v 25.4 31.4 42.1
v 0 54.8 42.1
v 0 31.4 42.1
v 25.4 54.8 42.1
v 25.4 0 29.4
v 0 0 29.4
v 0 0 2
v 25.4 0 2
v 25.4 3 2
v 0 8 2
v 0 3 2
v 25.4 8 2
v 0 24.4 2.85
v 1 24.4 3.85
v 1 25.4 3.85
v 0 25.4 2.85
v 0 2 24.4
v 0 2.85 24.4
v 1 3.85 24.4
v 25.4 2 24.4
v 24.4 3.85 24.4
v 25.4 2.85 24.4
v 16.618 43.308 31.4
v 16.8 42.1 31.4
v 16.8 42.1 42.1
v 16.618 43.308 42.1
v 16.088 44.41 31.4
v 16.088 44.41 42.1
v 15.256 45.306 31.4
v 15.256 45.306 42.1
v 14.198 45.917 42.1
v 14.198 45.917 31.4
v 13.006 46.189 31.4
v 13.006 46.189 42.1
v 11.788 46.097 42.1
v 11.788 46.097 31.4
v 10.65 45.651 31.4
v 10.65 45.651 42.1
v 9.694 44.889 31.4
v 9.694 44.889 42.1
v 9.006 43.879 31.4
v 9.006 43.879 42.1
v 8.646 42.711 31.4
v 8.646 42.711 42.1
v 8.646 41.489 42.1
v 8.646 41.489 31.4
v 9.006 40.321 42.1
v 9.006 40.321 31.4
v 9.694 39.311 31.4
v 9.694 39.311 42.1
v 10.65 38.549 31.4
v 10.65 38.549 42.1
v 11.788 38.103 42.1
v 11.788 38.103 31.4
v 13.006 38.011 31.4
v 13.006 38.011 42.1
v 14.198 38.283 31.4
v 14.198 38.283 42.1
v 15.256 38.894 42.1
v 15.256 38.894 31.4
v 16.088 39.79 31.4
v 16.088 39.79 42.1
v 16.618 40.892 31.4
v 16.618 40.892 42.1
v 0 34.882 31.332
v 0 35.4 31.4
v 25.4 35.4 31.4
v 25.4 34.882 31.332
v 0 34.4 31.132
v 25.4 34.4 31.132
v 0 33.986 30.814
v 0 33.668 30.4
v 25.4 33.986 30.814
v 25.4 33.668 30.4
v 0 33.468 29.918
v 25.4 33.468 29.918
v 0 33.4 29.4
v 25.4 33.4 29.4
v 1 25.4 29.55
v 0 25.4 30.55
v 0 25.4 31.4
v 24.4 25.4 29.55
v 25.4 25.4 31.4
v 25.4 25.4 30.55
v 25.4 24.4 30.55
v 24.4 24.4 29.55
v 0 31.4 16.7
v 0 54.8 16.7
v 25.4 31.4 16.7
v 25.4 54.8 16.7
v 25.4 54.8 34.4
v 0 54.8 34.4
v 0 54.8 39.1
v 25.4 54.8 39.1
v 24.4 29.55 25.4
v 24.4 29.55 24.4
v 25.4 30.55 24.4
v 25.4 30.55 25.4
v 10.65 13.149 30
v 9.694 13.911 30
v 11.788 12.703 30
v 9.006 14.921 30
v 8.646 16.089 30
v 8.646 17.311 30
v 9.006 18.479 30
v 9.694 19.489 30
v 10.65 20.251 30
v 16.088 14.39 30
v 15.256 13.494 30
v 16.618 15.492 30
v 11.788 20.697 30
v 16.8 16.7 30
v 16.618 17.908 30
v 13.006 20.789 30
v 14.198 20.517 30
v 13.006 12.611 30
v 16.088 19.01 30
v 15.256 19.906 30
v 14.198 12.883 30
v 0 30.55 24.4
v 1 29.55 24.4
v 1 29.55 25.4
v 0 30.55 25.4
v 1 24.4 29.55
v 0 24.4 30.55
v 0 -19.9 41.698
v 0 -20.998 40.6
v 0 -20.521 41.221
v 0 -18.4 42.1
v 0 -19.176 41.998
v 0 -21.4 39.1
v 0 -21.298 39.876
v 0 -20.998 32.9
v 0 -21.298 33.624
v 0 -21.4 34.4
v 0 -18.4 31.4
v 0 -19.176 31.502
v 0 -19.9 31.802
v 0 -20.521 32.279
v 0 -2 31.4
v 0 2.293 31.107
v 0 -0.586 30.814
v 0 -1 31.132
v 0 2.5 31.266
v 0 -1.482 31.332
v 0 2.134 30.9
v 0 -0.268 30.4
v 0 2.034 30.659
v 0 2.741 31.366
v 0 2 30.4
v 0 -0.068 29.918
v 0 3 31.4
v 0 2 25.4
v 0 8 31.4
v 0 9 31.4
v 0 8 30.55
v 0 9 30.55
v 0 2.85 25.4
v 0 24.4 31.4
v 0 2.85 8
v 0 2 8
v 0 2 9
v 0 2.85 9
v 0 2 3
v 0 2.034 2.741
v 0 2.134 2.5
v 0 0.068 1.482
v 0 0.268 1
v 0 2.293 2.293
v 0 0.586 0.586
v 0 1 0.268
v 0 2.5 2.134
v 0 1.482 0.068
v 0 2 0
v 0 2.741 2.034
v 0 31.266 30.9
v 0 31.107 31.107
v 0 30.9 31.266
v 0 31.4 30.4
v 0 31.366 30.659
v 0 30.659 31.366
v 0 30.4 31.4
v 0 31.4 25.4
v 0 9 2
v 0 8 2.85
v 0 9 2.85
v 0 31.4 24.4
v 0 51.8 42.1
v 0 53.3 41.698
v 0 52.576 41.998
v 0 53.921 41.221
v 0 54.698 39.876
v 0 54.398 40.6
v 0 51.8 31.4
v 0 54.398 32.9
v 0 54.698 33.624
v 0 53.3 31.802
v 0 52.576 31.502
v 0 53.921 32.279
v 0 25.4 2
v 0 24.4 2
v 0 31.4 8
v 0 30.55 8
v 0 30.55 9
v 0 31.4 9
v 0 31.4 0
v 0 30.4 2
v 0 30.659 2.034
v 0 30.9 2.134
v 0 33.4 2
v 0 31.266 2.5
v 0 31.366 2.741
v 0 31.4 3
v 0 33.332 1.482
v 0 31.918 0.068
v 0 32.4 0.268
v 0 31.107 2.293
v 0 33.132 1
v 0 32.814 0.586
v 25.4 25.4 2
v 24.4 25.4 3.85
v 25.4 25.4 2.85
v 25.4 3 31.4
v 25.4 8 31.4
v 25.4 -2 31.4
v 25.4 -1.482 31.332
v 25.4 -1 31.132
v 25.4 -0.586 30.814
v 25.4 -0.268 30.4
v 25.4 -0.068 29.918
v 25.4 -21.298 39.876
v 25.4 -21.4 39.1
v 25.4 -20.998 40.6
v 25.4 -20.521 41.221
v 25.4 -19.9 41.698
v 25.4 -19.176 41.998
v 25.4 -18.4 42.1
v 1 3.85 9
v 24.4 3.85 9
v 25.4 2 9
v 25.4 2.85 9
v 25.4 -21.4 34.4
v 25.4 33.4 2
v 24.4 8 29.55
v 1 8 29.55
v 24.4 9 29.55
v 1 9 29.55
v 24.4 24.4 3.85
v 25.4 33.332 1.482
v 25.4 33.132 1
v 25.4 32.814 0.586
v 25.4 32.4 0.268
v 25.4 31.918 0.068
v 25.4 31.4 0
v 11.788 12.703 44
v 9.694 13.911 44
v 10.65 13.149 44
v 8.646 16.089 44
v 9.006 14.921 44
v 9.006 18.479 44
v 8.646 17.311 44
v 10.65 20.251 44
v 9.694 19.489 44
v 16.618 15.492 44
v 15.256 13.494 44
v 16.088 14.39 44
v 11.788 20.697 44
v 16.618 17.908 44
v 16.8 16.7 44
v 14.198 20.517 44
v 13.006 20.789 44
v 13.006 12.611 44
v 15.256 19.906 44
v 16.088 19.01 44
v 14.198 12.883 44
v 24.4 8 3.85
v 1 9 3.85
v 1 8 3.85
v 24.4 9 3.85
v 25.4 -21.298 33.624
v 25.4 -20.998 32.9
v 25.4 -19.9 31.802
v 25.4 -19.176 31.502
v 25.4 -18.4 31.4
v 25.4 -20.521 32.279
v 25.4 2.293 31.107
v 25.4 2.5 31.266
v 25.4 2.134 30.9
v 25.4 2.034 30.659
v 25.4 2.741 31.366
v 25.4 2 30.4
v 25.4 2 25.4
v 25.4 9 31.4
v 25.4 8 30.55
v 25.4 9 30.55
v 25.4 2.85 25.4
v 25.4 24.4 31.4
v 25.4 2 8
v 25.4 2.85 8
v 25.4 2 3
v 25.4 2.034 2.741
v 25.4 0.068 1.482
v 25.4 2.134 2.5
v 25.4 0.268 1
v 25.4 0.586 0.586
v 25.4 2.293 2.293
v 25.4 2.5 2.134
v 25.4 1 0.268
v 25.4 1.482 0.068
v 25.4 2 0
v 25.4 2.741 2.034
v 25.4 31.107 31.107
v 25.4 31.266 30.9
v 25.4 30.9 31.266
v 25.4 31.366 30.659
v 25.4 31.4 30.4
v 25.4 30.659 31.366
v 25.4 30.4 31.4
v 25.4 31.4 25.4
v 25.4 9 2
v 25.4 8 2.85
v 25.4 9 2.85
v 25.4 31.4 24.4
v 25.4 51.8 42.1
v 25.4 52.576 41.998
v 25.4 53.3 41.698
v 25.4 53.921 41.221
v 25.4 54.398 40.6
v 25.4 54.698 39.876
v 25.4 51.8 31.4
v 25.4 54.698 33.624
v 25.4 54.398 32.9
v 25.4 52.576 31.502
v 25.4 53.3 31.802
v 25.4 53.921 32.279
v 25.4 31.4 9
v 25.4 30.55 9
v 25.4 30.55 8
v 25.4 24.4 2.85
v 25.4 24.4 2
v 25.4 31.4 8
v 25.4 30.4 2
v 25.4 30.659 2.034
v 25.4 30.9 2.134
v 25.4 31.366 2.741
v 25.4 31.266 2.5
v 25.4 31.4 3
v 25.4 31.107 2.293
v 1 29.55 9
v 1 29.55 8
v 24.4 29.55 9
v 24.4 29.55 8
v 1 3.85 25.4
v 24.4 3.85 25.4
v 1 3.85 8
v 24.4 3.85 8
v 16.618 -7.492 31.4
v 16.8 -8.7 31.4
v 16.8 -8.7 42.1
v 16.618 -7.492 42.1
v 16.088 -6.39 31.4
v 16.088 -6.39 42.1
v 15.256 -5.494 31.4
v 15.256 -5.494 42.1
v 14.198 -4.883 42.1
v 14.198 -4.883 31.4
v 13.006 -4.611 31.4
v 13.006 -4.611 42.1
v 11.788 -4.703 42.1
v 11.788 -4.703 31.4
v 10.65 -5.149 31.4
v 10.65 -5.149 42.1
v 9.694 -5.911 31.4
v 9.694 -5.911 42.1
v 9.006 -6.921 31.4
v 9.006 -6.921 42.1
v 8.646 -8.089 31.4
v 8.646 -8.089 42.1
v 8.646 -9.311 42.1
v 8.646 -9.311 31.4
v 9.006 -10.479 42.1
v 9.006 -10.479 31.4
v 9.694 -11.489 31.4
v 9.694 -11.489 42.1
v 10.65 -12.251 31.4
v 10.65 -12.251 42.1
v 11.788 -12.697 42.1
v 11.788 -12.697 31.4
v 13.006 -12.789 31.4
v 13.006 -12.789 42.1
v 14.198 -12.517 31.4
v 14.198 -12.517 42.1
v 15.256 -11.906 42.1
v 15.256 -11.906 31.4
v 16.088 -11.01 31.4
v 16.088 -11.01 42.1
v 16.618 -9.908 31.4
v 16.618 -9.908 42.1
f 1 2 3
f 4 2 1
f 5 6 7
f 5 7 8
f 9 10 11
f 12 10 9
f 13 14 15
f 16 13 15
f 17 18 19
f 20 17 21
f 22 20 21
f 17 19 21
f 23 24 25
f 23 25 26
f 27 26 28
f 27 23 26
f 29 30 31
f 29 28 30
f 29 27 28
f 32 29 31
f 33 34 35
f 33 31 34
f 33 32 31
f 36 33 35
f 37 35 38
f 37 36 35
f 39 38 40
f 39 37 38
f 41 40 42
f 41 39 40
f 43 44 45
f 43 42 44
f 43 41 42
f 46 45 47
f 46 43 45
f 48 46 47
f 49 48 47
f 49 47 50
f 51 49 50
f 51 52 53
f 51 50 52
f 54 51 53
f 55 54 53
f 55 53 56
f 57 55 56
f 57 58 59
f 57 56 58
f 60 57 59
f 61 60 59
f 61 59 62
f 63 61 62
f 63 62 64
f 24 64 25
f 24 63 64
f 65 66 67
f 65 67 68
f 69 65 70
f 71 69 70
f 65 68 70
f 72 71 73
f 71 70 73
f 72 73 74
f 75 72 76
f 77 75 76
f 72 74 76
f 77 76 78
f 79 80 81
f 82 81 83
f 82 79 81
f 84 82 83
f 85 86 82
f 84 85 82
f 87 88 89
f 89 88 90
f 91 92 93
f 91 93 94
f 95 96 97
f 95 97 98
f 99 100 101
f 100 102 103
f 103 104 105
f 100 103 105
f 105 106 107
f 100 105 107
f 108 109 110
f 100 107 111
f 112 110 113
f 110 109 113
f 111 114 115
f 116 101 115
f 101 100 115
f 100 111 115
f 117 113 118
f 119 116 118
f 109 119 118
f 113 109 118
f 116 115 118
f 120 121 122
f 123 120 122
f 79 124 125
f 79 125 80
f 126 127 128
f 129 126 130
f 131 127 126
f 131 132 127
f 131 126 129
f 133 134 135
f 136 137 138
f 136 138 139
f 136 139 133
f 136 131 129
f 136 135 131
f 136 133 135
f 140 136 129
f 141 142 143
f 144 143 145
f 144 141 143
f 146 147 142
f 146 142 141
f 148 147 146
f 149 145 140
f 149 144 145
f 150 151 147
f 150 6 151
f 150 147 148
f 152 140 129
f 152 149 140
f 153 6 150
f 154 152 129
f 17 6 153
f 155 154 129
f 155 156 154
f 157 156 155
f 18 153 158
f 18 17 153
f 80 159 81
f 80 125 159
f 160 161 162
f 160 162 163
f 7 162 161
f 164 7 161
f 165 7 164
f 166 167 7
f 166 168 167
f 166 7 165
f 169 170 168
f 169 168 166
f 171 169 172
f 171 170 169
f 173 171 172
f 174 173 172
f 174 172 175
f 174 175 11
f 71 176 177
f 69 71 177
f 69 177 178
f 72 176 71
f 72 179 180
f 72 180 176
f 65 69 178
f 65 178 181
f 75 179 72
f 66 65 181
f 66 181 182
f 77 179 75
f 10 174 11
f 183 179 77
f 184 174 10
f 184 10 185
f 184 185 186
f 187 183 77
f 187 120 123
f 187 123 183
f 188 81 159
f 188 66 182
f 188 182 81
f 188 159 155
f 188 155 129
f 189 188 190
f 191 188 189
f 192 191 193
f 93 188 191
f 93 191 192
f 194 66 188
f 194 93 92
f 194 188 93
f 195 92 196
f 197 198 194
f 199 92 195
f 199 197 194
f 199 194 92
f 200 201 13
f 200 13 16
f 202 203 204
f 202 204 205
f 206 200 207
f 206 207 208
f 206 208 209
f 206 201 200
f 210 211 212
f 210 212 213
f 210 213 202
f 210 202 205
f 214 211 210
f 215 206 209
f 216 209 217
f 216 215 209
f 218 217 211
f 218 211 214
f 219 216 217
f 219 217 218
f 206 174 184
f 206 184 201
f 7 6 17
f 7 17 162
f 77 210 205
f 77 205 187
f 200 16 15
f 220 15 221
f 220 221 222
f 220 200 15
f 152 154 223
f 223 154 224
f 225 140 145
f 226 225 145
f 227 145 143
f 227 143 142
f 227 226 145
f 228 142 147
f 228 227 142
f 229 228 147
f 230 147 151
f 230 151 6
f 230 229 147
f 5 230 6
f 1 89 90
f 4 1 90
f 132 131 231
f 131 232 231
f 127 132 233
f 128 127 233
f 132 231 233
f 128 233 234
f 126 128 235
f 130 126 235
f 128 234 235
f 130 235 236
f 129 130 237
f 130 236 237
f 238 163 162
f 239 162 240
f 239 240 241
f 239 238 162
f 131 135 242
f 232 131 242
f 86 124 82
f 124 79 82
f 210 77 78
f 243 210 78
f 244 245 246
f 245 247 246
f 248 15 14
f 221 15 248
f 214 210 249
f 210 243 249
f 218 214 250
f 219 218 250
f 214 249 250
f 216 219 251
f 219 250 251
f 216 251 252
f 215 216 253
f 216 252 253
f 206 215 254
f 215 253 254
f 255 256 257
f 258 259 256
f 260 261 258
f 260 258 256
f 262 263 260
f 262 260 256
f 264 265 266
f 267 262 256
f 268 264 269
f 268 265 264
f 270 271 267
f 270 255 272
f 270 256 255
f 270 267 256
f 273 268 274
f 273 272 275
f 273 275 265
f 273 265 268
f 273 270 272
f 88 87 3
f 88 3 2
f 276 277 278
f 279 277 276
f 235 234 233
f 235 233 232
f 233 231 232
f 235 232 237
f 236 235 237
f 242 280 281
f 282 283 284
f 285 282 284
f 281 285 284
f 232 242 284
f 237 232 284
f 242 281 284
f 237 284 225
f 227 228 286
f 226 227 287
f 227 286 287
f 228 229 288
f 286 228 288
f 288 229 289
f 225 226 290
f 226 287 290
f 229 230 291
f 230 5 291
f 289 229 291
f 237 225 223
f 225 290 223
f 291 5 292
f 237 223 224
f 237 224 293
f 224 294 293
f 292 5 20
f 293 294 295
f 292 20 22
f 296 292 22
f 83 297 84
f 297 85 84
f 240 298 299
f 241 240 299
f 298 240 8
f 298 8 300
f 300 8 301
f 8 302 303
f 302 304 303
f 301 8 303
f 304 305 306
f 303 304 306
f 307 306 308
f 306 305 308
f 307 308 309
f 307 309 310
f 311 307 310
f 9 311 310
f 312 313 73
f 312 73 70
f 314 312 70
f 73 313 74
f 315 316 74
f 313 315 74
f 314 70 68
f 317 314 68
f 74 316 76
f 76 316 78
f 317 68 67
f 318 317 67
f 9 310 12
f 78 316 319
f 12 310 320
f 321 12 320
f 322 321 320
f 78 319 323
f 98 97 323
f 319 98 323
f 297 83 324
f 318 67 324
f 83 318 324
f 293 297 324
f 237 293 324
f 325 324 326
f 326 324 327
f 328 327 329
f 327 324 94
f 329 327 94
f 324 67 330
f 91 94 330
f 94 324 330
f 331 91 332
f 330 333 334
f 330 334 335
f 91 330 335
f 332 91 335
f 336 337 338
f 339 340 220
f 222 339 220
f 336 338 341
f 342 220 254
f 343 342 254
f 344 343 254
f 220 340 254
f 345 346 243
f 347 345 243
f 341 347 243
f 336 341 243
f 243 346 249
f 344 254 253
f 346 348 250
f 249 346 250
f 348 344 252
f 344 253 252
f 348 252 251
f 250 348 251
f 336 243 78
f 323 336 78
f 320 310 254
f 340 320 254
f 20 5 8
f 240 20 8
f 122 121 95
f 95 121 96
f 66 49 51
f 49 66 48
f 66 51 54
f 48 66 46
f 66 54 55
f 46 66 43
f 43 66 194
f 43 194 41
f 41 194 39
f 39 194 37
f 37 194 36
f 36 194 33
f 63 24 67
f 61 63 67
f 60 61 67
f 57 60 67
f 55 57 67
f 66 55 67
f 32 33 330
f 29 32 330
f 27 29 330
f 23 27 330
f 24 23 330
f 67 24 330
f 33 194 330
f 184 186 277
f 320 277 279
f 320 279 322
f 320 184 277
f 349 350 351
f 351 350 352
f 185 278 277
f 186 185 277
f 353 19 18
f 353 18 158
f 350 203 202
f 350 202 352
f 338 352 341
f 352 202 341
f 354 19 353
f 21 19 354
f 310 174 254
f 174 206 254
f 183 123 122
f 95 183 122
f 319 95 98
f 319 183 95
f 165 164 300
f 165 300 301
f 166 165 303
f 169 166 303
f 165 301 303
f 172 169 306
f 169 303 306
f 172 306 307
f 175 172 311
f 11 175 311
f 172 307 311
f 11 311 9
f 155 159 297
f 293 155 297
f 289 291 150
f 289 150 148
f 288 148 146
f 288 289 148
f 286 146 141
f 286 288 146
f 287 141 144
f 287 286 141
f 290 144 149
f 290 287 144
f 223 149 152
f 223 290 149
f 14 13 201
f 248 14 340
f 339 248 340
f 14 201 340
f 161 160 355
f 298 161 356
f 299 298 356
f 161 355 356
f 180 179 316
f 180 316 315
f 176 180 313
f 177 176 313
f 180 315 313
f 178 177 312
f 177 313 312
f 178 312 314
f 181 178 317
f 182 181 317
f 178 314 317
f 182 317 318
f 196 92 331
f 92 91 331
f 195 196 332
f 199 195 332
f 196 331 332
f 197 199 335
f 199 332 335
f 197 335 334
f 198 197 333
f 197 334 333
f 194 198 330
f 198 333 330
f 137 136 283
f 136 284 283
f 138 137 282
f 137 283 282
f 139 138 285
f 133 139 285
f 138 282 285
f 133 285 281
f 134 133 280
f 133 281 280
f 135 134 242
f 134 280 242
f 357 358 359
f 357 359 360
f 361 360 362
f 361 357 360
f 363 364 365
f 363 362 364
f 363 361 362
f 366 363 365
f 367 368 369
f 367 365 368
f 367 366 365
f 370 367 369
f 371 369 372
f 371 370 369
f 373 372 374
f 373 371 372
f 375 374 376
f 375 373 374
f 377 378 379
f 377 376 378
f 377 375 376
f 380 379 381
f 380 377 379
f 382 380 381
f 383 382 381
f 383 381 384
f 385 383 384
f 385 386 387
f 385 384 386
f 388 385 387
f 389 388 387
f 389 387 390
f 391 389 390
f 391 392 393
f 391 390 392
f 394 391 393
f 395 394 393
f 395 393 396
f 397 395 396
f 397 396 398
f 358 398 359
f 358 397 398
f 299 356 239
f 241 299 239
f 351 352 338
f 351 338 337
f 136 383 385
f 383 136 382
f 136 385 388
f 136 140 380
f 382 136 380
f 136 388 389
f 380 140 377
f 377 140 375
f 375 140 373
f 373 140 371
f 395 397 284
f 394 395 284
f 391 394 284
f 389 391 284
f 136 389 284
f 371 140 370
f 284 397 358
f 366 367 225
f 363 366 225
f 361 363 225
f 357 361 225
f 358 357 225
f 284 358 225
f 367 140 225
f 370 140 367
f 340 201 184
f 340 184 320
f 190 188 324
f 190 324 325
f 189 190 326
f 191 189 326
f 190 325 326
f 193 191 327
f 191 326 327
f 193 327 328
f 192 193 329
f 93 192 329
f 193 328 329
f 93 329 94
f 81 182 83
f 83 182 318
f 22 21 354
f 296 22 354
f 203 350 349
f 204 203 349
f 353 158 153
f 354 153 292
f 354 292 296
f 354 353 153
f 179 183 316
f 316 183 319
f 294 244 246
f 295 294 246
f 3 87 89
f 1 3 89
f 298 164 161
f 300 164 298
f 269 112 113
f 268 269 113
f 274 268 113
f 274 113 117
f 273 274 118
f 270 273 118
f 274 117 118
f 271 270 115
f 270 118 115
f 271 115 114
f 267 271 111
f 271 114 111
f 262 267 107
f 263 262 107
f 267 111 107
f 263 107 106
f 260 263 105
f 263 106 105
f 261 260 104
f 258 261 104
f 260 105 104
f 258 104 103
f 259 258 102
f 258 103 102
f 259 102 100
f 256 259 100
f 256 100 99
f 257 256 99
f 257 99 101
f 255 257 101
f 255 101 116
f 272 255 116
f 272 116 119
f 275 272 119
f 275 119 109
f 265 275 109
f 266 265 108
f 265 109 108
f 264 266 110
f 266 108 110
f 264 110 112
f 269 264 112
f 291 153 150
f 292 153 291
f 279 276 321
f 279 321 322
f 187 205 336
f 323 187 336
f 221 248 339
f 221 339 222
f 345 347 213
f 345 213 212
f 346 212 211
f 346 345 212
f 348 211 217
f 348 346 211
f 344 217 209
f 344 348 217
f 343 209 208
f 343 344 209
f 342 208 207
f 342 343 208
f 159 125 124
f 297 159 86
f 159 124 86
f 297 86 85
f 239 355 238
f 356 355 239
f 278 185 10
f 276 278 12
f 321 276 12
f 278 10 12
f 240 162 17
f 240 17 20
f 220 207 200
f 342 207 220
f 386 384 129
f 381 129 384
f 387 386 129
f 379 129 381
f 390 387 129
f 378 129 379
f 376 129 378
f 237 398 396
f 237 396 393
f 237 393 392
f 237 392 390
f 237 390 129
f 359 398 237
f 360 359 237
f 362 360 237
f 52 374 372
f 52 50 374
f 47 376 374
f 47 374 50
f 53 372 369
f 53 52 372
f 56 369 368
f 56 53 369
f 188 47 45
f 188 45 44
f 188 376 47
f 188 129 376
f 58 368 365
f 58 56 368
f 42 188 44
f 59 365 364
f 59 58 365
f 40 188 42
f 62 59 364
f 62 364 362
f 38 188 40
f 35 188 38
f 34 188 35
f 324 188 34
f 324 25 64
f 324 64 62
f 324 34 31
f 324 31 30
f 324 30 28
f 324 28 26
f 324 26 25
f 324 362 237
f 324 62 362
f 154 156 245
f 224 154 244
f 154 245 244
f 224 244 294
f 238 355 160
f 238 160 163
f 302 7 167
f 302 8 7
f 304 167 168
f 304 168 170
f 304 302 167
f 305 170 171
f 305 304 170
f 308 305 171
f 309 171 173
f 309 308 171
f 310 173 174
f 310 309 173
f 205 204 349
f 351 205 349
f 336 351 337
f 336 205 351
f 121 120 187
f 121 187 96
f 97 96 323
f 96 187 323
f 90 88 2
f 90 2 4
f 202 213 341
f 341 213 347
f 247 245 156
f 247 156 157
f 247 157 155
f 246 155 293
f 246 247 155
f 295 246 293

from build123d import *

# Parameters (mm, degrees)
BOX011_W          = 25.4
BOX011_H          = 23.4
BOX011_DEPTH      = 25.4
CYLINDER001_R     = 4.1
CYLINDER001_DEPTH = 14
BOX004_W          = 25.4
BOX004_H          = 3.85
BOX004_DEPTH      = 1
BOX007_W          = 25.4
BOX007_H          = 1
BOX007_DEPTH      = 3.85
BOX006_W          = 25.4
BOX006_H          = 1
BOX006_DEPTH      = 3.85
BOX002_W          = 25.4
BOX002_H          = 3.85
BOX002_DEPTH      = 1
BOX003_W          = 25.4
BOX003_H          = 3.85
BOX003_DEPTH      = 1
BOX009_W          = 25.4
BOX009_H          = 1
BOX009_DEPTH      = 3.85
BOX008_W          = 25.4
BOX008_H          = 1
BOX008_DEPTH      = 3.85
BOX005_W          = 25.4
BOX005_H          = 3.85
BOX005_DEPTH      = 1
CYLINDER_R        = 4.1
CYLINDER_DEPTH    = 14
CYLINDER002_R     = 4.1
CYLINDER002_DEPTH = 14
BOX010_W          = 25.4
BOX010_H          = 76.2
BOX010_DEPTH      = 10.7
BOX_W             = 52
BOX_H             = 29.4
BOX_DEPTH         = 29.4
FILLET001_R       = 1
BOX001_W          = 25.4
BOX001_H          = 33.4
BOX001_DEPTH      = 33.4
FILLET_R          = 2
FILLET002_R       = 2
FILLET003_R       = 3
CHAMFER_SIZE      = 1


with BuildPart() as cube011:
    # Box011 → Box011 (new body)
    with BuildSketch(Plane(origin=(0, 31.4, 16.7), x_dir=(1, 0, 0), z_dir=(0, 0, 1))):
        with Locations((12.7, 11.7)):
            Rectangle(BOX011_W, BOX011_H)
    extrude(amount=BOX011_DEPTH)


with BuildPart() as cylinder001:
    # Cylinder001 → Cylinder001 (new body)
    with BuildSketch(Plane(origin=(12.7, 16.7, 30), x_dir=(1, 0, 0), z_dir=(0, 0, 1))):
        Circle(CYLINDER001_R)
    extrude(amount=CYLINDER001_DEPTH)


with BuildPart() as cube004:
    # Box004 → Box004 (new body)
    with BuildSketch(Plane(origin=(0, 29.55, 8), x_dir=(1, 0, 0), z_dir=(0, 0, 1))):
        with Locations((12.7, 1.925)):
            Rectangle(BOX004_W, BOX004_H)
    extrude(amount=BOX004_DEPTH)


with BuildPart() as cube007:
    # Box007 → Box007 (new body)
    with BuildSketch(Plane(origin=(0, 24.4, 0), x_dir=(1, 0, 0), z_dir=(0, 0, 1))):
        with Locations((12.7, 0.5)):
            Rectangle(BOX007_W, BOX007_H)
    extrude(amount=BOX007_DEPTH)


with BuildPart() as cube006:
    # Box006 → Box006 (new body)
    with BuildSketch(Plane(origin=(0, 8, 0), x_dir=(1, 0, 0), z_dir=(0, 0, 1))):
        with Locations((12.7, 0.5)):
            Rectangle(BOX006_W, BOX006_H)
    extrude(amount=BOX006_DEPTH)


with BuildPart() as cube002:
    # Box002 → Box002 (new body)
    with BuildSketch(Plane.XY.offset(8)):
        with Locations((12.7, 1.925)):
            Rectangle(BOX002_W, BOX002_H)
    extrude(amount=BOX002_DEPTH)


with BuildPart() as cube003:
    # Box003 → Box003 (new body)
    with BuildSketch(Plane.XY.offset(24.4)):
        with Locations((12.7, 1.925)):
            Rectangle(BOX003_W, BOX003_H)
    extrude(amount=BOX003_DEPTH)


with BuildPart() as cube009:
    # Box009 → Box009 (new body)
    with BuildSketch(Plane(origin=(0, 8, 29.55), x_dir=(1, 0, 0), z_dir=(0, 0, 1))):
        with Locations((12.7, 0.5)):
            Rectangle(BOX009_W, BOX009_H)
    extrude(amount=BOX009_DEPTH)


with BuildPart() as cube008:
    # Box008 → Box008 (new body)
    with BuildSketch(Plane(origin=(0, 24.4, 29.55), x_dir=(1, 0, 0), z_dir=(0, 0, 1))):
        with Locations((12.7, 0.5)):
            Rectangle(BOX008_W, BOX008_H)
    extrude(amount=BOX008_DEPTH)


with BuildPart() as cube005:
    # Box005 → Box005 (new body)
    with BuildSketch(Plane(origin=(0, 29.55, 24.4), x_dir=(1, 0, 0), z_dir=(0, 0, 1))):
        with Locations((12.7, 1.925)):
            Rectangle(BOX005_W, BOX005_H)
    extrude(amount=BOX005_DEPTH)


with BuildPart() as cylinder:
    # Cylinder → Cylinder (new body)
    with BuildSketch(Plane(origin=(12.7, 42.1, 30), x_dir=(1, 0, 0), z_dir=(0, 0, 1))):
        Circle(CYLINDER_R)
    extrude(amount=CYLINDER_DEPTH)


with BuildPart() as cylinder002:
    # Cylinder002 → Cylinder002 (new body)
    with BuildSketch(Plane(origin=(12.7, -8.7, 30), x_dir=(1, 0, 0), z_dir=(0, 0, 1))):
        Circle(CYLINDER002_R)
    extrude(amount=CYLINDER002_DEPTH)


with BuildPart() as cube010:
    # Box010 → Box010 (new body)
    with BuildSketch(Plane(origin=(0, -21.4, 31.4), x_dir=(1, 0, 0), z_dir=(0, 0, 1))):
        with Locations((12.7, 38.1)):
            Rectangle(BOX010_W, BOX010_H)
    extrude(amount=BOX010_DEPTH)


with BuildPart() as fillet001:
    # Box → Box (new body)
    with BuildSketch(Plane(origin=(-1, 2, 2), x_dir=(1, 0, 0), z_dir=(0, 0, 1))):
        with Locations((26, 14.7)):
            Rectangle(BOX_W, BOX_H)
    extrude(amount=BOX_DEPTH)

    # Fillet001
    fillet001_edges = [fillet001.edges().sort_by_distance(p)[0] for p in [
        (25, 2, 31.4),
        (25, 2, 2),
        (25, 31.4, 31.4),
        (25, 31.4, 2),
    ]]
    fillet(fillet001_edges, radius=FILLET001_R)


with BuildPart() as chamfer_body:
    # Box001 → Box001 (new body)
    with BuildSketch(Plane.XY):
        with Locations((12.7, 16.7)):
            Rectangle(BOX001_W, BOX001_H)
    extrude(amount=BOX001_DEPTH)

    # Fillet
    fillet_edges = [chamfer_body.edges().sort_by_distance(p)[0] for p in [
        (12.7, 33.4, 0),
        (12.7, 0, 0),
        (12.7, 0, 33.4),
        (12.7, 33.4, 33.4),
    ]]
    fillet(fillet_edges, radius=FILLET_R)

    # Cut: cut Fillet001
    add(fillet001.part, mode=Mode.SUBTRACT)

    # Fusion: union Cube010
    add(cube010.part)

    # Fillet002
    fillet002_edges = [chamfer_body.edges().sort_by_distance(p)[0] for p in [
        (12.7, 33.4, 31.4),
        (12.7, 0, 31.4),
    ]]
    fillet(fillet002_edges, radius=FILLET002_R)

    # Fillet003
    fillet003_edges = [chamfer_body.edges().sort_by_distance(p)[0] for p in [
        (12.7, -21.4, 31.4),
        (12.7, -21.4, 42.1),
        (12.7, 54.8, 31.4),
        (12.7, 54.8, 42.1),
    ]]
    fillet(fillet003_edges, radius=FILLET003_R)

    # Cut001: cut Cylinder002
    add(cylinder002.part, mode=Mode.SUBTRACT)

    # Cut002: cut Cylinder
    add(cylinder.part, mode=Mode.SUBTRACT)

    # Fusion001: union Cube004, Cube007, Cube006, Cube002, Cube003, Cube009, Cube008, Cube005
    add(cube004.part)
    add(cube007.part)
    add(cube006.part)
    add(cube002.part)
    add(cube003.part)
    add(cube009.part)
    add(cube008.part)
    add(cube005.part)

    # Chamfer
    chamfer_edges = [chamfer_body.edges().sort_by_distance(p)[0] for p in [
        (25.4, 8.5, 29.55),
        (25.4, 3.85, 24.9),
        (25.4, 3.85, 8.5),
        (25.4, 8.5, 3.85),
        (25.4, 24.9, 3.85),
        (25.4, 29.55, 8.5),
        (25.4, 29.55, 24.9),
        (25.4, 24.9, 29.55),
        (0, 29.55, 8.5),
        (0, 24.9, 3.85),
        (0, 8.5, 3.85),
        (0, 3.85, 8.5),
        (0, 3.85, 24.9),
        (0, 8.5, 29.55),
        (0, 24.9, 29.55),
        (0, 29.55, 24.9),
    ]]
    chamfer(chamfer_edges, length=CHAMFER_SIZE)


solid = Compound([cube011.part, cylinder001.part, chamfer_body.part])
